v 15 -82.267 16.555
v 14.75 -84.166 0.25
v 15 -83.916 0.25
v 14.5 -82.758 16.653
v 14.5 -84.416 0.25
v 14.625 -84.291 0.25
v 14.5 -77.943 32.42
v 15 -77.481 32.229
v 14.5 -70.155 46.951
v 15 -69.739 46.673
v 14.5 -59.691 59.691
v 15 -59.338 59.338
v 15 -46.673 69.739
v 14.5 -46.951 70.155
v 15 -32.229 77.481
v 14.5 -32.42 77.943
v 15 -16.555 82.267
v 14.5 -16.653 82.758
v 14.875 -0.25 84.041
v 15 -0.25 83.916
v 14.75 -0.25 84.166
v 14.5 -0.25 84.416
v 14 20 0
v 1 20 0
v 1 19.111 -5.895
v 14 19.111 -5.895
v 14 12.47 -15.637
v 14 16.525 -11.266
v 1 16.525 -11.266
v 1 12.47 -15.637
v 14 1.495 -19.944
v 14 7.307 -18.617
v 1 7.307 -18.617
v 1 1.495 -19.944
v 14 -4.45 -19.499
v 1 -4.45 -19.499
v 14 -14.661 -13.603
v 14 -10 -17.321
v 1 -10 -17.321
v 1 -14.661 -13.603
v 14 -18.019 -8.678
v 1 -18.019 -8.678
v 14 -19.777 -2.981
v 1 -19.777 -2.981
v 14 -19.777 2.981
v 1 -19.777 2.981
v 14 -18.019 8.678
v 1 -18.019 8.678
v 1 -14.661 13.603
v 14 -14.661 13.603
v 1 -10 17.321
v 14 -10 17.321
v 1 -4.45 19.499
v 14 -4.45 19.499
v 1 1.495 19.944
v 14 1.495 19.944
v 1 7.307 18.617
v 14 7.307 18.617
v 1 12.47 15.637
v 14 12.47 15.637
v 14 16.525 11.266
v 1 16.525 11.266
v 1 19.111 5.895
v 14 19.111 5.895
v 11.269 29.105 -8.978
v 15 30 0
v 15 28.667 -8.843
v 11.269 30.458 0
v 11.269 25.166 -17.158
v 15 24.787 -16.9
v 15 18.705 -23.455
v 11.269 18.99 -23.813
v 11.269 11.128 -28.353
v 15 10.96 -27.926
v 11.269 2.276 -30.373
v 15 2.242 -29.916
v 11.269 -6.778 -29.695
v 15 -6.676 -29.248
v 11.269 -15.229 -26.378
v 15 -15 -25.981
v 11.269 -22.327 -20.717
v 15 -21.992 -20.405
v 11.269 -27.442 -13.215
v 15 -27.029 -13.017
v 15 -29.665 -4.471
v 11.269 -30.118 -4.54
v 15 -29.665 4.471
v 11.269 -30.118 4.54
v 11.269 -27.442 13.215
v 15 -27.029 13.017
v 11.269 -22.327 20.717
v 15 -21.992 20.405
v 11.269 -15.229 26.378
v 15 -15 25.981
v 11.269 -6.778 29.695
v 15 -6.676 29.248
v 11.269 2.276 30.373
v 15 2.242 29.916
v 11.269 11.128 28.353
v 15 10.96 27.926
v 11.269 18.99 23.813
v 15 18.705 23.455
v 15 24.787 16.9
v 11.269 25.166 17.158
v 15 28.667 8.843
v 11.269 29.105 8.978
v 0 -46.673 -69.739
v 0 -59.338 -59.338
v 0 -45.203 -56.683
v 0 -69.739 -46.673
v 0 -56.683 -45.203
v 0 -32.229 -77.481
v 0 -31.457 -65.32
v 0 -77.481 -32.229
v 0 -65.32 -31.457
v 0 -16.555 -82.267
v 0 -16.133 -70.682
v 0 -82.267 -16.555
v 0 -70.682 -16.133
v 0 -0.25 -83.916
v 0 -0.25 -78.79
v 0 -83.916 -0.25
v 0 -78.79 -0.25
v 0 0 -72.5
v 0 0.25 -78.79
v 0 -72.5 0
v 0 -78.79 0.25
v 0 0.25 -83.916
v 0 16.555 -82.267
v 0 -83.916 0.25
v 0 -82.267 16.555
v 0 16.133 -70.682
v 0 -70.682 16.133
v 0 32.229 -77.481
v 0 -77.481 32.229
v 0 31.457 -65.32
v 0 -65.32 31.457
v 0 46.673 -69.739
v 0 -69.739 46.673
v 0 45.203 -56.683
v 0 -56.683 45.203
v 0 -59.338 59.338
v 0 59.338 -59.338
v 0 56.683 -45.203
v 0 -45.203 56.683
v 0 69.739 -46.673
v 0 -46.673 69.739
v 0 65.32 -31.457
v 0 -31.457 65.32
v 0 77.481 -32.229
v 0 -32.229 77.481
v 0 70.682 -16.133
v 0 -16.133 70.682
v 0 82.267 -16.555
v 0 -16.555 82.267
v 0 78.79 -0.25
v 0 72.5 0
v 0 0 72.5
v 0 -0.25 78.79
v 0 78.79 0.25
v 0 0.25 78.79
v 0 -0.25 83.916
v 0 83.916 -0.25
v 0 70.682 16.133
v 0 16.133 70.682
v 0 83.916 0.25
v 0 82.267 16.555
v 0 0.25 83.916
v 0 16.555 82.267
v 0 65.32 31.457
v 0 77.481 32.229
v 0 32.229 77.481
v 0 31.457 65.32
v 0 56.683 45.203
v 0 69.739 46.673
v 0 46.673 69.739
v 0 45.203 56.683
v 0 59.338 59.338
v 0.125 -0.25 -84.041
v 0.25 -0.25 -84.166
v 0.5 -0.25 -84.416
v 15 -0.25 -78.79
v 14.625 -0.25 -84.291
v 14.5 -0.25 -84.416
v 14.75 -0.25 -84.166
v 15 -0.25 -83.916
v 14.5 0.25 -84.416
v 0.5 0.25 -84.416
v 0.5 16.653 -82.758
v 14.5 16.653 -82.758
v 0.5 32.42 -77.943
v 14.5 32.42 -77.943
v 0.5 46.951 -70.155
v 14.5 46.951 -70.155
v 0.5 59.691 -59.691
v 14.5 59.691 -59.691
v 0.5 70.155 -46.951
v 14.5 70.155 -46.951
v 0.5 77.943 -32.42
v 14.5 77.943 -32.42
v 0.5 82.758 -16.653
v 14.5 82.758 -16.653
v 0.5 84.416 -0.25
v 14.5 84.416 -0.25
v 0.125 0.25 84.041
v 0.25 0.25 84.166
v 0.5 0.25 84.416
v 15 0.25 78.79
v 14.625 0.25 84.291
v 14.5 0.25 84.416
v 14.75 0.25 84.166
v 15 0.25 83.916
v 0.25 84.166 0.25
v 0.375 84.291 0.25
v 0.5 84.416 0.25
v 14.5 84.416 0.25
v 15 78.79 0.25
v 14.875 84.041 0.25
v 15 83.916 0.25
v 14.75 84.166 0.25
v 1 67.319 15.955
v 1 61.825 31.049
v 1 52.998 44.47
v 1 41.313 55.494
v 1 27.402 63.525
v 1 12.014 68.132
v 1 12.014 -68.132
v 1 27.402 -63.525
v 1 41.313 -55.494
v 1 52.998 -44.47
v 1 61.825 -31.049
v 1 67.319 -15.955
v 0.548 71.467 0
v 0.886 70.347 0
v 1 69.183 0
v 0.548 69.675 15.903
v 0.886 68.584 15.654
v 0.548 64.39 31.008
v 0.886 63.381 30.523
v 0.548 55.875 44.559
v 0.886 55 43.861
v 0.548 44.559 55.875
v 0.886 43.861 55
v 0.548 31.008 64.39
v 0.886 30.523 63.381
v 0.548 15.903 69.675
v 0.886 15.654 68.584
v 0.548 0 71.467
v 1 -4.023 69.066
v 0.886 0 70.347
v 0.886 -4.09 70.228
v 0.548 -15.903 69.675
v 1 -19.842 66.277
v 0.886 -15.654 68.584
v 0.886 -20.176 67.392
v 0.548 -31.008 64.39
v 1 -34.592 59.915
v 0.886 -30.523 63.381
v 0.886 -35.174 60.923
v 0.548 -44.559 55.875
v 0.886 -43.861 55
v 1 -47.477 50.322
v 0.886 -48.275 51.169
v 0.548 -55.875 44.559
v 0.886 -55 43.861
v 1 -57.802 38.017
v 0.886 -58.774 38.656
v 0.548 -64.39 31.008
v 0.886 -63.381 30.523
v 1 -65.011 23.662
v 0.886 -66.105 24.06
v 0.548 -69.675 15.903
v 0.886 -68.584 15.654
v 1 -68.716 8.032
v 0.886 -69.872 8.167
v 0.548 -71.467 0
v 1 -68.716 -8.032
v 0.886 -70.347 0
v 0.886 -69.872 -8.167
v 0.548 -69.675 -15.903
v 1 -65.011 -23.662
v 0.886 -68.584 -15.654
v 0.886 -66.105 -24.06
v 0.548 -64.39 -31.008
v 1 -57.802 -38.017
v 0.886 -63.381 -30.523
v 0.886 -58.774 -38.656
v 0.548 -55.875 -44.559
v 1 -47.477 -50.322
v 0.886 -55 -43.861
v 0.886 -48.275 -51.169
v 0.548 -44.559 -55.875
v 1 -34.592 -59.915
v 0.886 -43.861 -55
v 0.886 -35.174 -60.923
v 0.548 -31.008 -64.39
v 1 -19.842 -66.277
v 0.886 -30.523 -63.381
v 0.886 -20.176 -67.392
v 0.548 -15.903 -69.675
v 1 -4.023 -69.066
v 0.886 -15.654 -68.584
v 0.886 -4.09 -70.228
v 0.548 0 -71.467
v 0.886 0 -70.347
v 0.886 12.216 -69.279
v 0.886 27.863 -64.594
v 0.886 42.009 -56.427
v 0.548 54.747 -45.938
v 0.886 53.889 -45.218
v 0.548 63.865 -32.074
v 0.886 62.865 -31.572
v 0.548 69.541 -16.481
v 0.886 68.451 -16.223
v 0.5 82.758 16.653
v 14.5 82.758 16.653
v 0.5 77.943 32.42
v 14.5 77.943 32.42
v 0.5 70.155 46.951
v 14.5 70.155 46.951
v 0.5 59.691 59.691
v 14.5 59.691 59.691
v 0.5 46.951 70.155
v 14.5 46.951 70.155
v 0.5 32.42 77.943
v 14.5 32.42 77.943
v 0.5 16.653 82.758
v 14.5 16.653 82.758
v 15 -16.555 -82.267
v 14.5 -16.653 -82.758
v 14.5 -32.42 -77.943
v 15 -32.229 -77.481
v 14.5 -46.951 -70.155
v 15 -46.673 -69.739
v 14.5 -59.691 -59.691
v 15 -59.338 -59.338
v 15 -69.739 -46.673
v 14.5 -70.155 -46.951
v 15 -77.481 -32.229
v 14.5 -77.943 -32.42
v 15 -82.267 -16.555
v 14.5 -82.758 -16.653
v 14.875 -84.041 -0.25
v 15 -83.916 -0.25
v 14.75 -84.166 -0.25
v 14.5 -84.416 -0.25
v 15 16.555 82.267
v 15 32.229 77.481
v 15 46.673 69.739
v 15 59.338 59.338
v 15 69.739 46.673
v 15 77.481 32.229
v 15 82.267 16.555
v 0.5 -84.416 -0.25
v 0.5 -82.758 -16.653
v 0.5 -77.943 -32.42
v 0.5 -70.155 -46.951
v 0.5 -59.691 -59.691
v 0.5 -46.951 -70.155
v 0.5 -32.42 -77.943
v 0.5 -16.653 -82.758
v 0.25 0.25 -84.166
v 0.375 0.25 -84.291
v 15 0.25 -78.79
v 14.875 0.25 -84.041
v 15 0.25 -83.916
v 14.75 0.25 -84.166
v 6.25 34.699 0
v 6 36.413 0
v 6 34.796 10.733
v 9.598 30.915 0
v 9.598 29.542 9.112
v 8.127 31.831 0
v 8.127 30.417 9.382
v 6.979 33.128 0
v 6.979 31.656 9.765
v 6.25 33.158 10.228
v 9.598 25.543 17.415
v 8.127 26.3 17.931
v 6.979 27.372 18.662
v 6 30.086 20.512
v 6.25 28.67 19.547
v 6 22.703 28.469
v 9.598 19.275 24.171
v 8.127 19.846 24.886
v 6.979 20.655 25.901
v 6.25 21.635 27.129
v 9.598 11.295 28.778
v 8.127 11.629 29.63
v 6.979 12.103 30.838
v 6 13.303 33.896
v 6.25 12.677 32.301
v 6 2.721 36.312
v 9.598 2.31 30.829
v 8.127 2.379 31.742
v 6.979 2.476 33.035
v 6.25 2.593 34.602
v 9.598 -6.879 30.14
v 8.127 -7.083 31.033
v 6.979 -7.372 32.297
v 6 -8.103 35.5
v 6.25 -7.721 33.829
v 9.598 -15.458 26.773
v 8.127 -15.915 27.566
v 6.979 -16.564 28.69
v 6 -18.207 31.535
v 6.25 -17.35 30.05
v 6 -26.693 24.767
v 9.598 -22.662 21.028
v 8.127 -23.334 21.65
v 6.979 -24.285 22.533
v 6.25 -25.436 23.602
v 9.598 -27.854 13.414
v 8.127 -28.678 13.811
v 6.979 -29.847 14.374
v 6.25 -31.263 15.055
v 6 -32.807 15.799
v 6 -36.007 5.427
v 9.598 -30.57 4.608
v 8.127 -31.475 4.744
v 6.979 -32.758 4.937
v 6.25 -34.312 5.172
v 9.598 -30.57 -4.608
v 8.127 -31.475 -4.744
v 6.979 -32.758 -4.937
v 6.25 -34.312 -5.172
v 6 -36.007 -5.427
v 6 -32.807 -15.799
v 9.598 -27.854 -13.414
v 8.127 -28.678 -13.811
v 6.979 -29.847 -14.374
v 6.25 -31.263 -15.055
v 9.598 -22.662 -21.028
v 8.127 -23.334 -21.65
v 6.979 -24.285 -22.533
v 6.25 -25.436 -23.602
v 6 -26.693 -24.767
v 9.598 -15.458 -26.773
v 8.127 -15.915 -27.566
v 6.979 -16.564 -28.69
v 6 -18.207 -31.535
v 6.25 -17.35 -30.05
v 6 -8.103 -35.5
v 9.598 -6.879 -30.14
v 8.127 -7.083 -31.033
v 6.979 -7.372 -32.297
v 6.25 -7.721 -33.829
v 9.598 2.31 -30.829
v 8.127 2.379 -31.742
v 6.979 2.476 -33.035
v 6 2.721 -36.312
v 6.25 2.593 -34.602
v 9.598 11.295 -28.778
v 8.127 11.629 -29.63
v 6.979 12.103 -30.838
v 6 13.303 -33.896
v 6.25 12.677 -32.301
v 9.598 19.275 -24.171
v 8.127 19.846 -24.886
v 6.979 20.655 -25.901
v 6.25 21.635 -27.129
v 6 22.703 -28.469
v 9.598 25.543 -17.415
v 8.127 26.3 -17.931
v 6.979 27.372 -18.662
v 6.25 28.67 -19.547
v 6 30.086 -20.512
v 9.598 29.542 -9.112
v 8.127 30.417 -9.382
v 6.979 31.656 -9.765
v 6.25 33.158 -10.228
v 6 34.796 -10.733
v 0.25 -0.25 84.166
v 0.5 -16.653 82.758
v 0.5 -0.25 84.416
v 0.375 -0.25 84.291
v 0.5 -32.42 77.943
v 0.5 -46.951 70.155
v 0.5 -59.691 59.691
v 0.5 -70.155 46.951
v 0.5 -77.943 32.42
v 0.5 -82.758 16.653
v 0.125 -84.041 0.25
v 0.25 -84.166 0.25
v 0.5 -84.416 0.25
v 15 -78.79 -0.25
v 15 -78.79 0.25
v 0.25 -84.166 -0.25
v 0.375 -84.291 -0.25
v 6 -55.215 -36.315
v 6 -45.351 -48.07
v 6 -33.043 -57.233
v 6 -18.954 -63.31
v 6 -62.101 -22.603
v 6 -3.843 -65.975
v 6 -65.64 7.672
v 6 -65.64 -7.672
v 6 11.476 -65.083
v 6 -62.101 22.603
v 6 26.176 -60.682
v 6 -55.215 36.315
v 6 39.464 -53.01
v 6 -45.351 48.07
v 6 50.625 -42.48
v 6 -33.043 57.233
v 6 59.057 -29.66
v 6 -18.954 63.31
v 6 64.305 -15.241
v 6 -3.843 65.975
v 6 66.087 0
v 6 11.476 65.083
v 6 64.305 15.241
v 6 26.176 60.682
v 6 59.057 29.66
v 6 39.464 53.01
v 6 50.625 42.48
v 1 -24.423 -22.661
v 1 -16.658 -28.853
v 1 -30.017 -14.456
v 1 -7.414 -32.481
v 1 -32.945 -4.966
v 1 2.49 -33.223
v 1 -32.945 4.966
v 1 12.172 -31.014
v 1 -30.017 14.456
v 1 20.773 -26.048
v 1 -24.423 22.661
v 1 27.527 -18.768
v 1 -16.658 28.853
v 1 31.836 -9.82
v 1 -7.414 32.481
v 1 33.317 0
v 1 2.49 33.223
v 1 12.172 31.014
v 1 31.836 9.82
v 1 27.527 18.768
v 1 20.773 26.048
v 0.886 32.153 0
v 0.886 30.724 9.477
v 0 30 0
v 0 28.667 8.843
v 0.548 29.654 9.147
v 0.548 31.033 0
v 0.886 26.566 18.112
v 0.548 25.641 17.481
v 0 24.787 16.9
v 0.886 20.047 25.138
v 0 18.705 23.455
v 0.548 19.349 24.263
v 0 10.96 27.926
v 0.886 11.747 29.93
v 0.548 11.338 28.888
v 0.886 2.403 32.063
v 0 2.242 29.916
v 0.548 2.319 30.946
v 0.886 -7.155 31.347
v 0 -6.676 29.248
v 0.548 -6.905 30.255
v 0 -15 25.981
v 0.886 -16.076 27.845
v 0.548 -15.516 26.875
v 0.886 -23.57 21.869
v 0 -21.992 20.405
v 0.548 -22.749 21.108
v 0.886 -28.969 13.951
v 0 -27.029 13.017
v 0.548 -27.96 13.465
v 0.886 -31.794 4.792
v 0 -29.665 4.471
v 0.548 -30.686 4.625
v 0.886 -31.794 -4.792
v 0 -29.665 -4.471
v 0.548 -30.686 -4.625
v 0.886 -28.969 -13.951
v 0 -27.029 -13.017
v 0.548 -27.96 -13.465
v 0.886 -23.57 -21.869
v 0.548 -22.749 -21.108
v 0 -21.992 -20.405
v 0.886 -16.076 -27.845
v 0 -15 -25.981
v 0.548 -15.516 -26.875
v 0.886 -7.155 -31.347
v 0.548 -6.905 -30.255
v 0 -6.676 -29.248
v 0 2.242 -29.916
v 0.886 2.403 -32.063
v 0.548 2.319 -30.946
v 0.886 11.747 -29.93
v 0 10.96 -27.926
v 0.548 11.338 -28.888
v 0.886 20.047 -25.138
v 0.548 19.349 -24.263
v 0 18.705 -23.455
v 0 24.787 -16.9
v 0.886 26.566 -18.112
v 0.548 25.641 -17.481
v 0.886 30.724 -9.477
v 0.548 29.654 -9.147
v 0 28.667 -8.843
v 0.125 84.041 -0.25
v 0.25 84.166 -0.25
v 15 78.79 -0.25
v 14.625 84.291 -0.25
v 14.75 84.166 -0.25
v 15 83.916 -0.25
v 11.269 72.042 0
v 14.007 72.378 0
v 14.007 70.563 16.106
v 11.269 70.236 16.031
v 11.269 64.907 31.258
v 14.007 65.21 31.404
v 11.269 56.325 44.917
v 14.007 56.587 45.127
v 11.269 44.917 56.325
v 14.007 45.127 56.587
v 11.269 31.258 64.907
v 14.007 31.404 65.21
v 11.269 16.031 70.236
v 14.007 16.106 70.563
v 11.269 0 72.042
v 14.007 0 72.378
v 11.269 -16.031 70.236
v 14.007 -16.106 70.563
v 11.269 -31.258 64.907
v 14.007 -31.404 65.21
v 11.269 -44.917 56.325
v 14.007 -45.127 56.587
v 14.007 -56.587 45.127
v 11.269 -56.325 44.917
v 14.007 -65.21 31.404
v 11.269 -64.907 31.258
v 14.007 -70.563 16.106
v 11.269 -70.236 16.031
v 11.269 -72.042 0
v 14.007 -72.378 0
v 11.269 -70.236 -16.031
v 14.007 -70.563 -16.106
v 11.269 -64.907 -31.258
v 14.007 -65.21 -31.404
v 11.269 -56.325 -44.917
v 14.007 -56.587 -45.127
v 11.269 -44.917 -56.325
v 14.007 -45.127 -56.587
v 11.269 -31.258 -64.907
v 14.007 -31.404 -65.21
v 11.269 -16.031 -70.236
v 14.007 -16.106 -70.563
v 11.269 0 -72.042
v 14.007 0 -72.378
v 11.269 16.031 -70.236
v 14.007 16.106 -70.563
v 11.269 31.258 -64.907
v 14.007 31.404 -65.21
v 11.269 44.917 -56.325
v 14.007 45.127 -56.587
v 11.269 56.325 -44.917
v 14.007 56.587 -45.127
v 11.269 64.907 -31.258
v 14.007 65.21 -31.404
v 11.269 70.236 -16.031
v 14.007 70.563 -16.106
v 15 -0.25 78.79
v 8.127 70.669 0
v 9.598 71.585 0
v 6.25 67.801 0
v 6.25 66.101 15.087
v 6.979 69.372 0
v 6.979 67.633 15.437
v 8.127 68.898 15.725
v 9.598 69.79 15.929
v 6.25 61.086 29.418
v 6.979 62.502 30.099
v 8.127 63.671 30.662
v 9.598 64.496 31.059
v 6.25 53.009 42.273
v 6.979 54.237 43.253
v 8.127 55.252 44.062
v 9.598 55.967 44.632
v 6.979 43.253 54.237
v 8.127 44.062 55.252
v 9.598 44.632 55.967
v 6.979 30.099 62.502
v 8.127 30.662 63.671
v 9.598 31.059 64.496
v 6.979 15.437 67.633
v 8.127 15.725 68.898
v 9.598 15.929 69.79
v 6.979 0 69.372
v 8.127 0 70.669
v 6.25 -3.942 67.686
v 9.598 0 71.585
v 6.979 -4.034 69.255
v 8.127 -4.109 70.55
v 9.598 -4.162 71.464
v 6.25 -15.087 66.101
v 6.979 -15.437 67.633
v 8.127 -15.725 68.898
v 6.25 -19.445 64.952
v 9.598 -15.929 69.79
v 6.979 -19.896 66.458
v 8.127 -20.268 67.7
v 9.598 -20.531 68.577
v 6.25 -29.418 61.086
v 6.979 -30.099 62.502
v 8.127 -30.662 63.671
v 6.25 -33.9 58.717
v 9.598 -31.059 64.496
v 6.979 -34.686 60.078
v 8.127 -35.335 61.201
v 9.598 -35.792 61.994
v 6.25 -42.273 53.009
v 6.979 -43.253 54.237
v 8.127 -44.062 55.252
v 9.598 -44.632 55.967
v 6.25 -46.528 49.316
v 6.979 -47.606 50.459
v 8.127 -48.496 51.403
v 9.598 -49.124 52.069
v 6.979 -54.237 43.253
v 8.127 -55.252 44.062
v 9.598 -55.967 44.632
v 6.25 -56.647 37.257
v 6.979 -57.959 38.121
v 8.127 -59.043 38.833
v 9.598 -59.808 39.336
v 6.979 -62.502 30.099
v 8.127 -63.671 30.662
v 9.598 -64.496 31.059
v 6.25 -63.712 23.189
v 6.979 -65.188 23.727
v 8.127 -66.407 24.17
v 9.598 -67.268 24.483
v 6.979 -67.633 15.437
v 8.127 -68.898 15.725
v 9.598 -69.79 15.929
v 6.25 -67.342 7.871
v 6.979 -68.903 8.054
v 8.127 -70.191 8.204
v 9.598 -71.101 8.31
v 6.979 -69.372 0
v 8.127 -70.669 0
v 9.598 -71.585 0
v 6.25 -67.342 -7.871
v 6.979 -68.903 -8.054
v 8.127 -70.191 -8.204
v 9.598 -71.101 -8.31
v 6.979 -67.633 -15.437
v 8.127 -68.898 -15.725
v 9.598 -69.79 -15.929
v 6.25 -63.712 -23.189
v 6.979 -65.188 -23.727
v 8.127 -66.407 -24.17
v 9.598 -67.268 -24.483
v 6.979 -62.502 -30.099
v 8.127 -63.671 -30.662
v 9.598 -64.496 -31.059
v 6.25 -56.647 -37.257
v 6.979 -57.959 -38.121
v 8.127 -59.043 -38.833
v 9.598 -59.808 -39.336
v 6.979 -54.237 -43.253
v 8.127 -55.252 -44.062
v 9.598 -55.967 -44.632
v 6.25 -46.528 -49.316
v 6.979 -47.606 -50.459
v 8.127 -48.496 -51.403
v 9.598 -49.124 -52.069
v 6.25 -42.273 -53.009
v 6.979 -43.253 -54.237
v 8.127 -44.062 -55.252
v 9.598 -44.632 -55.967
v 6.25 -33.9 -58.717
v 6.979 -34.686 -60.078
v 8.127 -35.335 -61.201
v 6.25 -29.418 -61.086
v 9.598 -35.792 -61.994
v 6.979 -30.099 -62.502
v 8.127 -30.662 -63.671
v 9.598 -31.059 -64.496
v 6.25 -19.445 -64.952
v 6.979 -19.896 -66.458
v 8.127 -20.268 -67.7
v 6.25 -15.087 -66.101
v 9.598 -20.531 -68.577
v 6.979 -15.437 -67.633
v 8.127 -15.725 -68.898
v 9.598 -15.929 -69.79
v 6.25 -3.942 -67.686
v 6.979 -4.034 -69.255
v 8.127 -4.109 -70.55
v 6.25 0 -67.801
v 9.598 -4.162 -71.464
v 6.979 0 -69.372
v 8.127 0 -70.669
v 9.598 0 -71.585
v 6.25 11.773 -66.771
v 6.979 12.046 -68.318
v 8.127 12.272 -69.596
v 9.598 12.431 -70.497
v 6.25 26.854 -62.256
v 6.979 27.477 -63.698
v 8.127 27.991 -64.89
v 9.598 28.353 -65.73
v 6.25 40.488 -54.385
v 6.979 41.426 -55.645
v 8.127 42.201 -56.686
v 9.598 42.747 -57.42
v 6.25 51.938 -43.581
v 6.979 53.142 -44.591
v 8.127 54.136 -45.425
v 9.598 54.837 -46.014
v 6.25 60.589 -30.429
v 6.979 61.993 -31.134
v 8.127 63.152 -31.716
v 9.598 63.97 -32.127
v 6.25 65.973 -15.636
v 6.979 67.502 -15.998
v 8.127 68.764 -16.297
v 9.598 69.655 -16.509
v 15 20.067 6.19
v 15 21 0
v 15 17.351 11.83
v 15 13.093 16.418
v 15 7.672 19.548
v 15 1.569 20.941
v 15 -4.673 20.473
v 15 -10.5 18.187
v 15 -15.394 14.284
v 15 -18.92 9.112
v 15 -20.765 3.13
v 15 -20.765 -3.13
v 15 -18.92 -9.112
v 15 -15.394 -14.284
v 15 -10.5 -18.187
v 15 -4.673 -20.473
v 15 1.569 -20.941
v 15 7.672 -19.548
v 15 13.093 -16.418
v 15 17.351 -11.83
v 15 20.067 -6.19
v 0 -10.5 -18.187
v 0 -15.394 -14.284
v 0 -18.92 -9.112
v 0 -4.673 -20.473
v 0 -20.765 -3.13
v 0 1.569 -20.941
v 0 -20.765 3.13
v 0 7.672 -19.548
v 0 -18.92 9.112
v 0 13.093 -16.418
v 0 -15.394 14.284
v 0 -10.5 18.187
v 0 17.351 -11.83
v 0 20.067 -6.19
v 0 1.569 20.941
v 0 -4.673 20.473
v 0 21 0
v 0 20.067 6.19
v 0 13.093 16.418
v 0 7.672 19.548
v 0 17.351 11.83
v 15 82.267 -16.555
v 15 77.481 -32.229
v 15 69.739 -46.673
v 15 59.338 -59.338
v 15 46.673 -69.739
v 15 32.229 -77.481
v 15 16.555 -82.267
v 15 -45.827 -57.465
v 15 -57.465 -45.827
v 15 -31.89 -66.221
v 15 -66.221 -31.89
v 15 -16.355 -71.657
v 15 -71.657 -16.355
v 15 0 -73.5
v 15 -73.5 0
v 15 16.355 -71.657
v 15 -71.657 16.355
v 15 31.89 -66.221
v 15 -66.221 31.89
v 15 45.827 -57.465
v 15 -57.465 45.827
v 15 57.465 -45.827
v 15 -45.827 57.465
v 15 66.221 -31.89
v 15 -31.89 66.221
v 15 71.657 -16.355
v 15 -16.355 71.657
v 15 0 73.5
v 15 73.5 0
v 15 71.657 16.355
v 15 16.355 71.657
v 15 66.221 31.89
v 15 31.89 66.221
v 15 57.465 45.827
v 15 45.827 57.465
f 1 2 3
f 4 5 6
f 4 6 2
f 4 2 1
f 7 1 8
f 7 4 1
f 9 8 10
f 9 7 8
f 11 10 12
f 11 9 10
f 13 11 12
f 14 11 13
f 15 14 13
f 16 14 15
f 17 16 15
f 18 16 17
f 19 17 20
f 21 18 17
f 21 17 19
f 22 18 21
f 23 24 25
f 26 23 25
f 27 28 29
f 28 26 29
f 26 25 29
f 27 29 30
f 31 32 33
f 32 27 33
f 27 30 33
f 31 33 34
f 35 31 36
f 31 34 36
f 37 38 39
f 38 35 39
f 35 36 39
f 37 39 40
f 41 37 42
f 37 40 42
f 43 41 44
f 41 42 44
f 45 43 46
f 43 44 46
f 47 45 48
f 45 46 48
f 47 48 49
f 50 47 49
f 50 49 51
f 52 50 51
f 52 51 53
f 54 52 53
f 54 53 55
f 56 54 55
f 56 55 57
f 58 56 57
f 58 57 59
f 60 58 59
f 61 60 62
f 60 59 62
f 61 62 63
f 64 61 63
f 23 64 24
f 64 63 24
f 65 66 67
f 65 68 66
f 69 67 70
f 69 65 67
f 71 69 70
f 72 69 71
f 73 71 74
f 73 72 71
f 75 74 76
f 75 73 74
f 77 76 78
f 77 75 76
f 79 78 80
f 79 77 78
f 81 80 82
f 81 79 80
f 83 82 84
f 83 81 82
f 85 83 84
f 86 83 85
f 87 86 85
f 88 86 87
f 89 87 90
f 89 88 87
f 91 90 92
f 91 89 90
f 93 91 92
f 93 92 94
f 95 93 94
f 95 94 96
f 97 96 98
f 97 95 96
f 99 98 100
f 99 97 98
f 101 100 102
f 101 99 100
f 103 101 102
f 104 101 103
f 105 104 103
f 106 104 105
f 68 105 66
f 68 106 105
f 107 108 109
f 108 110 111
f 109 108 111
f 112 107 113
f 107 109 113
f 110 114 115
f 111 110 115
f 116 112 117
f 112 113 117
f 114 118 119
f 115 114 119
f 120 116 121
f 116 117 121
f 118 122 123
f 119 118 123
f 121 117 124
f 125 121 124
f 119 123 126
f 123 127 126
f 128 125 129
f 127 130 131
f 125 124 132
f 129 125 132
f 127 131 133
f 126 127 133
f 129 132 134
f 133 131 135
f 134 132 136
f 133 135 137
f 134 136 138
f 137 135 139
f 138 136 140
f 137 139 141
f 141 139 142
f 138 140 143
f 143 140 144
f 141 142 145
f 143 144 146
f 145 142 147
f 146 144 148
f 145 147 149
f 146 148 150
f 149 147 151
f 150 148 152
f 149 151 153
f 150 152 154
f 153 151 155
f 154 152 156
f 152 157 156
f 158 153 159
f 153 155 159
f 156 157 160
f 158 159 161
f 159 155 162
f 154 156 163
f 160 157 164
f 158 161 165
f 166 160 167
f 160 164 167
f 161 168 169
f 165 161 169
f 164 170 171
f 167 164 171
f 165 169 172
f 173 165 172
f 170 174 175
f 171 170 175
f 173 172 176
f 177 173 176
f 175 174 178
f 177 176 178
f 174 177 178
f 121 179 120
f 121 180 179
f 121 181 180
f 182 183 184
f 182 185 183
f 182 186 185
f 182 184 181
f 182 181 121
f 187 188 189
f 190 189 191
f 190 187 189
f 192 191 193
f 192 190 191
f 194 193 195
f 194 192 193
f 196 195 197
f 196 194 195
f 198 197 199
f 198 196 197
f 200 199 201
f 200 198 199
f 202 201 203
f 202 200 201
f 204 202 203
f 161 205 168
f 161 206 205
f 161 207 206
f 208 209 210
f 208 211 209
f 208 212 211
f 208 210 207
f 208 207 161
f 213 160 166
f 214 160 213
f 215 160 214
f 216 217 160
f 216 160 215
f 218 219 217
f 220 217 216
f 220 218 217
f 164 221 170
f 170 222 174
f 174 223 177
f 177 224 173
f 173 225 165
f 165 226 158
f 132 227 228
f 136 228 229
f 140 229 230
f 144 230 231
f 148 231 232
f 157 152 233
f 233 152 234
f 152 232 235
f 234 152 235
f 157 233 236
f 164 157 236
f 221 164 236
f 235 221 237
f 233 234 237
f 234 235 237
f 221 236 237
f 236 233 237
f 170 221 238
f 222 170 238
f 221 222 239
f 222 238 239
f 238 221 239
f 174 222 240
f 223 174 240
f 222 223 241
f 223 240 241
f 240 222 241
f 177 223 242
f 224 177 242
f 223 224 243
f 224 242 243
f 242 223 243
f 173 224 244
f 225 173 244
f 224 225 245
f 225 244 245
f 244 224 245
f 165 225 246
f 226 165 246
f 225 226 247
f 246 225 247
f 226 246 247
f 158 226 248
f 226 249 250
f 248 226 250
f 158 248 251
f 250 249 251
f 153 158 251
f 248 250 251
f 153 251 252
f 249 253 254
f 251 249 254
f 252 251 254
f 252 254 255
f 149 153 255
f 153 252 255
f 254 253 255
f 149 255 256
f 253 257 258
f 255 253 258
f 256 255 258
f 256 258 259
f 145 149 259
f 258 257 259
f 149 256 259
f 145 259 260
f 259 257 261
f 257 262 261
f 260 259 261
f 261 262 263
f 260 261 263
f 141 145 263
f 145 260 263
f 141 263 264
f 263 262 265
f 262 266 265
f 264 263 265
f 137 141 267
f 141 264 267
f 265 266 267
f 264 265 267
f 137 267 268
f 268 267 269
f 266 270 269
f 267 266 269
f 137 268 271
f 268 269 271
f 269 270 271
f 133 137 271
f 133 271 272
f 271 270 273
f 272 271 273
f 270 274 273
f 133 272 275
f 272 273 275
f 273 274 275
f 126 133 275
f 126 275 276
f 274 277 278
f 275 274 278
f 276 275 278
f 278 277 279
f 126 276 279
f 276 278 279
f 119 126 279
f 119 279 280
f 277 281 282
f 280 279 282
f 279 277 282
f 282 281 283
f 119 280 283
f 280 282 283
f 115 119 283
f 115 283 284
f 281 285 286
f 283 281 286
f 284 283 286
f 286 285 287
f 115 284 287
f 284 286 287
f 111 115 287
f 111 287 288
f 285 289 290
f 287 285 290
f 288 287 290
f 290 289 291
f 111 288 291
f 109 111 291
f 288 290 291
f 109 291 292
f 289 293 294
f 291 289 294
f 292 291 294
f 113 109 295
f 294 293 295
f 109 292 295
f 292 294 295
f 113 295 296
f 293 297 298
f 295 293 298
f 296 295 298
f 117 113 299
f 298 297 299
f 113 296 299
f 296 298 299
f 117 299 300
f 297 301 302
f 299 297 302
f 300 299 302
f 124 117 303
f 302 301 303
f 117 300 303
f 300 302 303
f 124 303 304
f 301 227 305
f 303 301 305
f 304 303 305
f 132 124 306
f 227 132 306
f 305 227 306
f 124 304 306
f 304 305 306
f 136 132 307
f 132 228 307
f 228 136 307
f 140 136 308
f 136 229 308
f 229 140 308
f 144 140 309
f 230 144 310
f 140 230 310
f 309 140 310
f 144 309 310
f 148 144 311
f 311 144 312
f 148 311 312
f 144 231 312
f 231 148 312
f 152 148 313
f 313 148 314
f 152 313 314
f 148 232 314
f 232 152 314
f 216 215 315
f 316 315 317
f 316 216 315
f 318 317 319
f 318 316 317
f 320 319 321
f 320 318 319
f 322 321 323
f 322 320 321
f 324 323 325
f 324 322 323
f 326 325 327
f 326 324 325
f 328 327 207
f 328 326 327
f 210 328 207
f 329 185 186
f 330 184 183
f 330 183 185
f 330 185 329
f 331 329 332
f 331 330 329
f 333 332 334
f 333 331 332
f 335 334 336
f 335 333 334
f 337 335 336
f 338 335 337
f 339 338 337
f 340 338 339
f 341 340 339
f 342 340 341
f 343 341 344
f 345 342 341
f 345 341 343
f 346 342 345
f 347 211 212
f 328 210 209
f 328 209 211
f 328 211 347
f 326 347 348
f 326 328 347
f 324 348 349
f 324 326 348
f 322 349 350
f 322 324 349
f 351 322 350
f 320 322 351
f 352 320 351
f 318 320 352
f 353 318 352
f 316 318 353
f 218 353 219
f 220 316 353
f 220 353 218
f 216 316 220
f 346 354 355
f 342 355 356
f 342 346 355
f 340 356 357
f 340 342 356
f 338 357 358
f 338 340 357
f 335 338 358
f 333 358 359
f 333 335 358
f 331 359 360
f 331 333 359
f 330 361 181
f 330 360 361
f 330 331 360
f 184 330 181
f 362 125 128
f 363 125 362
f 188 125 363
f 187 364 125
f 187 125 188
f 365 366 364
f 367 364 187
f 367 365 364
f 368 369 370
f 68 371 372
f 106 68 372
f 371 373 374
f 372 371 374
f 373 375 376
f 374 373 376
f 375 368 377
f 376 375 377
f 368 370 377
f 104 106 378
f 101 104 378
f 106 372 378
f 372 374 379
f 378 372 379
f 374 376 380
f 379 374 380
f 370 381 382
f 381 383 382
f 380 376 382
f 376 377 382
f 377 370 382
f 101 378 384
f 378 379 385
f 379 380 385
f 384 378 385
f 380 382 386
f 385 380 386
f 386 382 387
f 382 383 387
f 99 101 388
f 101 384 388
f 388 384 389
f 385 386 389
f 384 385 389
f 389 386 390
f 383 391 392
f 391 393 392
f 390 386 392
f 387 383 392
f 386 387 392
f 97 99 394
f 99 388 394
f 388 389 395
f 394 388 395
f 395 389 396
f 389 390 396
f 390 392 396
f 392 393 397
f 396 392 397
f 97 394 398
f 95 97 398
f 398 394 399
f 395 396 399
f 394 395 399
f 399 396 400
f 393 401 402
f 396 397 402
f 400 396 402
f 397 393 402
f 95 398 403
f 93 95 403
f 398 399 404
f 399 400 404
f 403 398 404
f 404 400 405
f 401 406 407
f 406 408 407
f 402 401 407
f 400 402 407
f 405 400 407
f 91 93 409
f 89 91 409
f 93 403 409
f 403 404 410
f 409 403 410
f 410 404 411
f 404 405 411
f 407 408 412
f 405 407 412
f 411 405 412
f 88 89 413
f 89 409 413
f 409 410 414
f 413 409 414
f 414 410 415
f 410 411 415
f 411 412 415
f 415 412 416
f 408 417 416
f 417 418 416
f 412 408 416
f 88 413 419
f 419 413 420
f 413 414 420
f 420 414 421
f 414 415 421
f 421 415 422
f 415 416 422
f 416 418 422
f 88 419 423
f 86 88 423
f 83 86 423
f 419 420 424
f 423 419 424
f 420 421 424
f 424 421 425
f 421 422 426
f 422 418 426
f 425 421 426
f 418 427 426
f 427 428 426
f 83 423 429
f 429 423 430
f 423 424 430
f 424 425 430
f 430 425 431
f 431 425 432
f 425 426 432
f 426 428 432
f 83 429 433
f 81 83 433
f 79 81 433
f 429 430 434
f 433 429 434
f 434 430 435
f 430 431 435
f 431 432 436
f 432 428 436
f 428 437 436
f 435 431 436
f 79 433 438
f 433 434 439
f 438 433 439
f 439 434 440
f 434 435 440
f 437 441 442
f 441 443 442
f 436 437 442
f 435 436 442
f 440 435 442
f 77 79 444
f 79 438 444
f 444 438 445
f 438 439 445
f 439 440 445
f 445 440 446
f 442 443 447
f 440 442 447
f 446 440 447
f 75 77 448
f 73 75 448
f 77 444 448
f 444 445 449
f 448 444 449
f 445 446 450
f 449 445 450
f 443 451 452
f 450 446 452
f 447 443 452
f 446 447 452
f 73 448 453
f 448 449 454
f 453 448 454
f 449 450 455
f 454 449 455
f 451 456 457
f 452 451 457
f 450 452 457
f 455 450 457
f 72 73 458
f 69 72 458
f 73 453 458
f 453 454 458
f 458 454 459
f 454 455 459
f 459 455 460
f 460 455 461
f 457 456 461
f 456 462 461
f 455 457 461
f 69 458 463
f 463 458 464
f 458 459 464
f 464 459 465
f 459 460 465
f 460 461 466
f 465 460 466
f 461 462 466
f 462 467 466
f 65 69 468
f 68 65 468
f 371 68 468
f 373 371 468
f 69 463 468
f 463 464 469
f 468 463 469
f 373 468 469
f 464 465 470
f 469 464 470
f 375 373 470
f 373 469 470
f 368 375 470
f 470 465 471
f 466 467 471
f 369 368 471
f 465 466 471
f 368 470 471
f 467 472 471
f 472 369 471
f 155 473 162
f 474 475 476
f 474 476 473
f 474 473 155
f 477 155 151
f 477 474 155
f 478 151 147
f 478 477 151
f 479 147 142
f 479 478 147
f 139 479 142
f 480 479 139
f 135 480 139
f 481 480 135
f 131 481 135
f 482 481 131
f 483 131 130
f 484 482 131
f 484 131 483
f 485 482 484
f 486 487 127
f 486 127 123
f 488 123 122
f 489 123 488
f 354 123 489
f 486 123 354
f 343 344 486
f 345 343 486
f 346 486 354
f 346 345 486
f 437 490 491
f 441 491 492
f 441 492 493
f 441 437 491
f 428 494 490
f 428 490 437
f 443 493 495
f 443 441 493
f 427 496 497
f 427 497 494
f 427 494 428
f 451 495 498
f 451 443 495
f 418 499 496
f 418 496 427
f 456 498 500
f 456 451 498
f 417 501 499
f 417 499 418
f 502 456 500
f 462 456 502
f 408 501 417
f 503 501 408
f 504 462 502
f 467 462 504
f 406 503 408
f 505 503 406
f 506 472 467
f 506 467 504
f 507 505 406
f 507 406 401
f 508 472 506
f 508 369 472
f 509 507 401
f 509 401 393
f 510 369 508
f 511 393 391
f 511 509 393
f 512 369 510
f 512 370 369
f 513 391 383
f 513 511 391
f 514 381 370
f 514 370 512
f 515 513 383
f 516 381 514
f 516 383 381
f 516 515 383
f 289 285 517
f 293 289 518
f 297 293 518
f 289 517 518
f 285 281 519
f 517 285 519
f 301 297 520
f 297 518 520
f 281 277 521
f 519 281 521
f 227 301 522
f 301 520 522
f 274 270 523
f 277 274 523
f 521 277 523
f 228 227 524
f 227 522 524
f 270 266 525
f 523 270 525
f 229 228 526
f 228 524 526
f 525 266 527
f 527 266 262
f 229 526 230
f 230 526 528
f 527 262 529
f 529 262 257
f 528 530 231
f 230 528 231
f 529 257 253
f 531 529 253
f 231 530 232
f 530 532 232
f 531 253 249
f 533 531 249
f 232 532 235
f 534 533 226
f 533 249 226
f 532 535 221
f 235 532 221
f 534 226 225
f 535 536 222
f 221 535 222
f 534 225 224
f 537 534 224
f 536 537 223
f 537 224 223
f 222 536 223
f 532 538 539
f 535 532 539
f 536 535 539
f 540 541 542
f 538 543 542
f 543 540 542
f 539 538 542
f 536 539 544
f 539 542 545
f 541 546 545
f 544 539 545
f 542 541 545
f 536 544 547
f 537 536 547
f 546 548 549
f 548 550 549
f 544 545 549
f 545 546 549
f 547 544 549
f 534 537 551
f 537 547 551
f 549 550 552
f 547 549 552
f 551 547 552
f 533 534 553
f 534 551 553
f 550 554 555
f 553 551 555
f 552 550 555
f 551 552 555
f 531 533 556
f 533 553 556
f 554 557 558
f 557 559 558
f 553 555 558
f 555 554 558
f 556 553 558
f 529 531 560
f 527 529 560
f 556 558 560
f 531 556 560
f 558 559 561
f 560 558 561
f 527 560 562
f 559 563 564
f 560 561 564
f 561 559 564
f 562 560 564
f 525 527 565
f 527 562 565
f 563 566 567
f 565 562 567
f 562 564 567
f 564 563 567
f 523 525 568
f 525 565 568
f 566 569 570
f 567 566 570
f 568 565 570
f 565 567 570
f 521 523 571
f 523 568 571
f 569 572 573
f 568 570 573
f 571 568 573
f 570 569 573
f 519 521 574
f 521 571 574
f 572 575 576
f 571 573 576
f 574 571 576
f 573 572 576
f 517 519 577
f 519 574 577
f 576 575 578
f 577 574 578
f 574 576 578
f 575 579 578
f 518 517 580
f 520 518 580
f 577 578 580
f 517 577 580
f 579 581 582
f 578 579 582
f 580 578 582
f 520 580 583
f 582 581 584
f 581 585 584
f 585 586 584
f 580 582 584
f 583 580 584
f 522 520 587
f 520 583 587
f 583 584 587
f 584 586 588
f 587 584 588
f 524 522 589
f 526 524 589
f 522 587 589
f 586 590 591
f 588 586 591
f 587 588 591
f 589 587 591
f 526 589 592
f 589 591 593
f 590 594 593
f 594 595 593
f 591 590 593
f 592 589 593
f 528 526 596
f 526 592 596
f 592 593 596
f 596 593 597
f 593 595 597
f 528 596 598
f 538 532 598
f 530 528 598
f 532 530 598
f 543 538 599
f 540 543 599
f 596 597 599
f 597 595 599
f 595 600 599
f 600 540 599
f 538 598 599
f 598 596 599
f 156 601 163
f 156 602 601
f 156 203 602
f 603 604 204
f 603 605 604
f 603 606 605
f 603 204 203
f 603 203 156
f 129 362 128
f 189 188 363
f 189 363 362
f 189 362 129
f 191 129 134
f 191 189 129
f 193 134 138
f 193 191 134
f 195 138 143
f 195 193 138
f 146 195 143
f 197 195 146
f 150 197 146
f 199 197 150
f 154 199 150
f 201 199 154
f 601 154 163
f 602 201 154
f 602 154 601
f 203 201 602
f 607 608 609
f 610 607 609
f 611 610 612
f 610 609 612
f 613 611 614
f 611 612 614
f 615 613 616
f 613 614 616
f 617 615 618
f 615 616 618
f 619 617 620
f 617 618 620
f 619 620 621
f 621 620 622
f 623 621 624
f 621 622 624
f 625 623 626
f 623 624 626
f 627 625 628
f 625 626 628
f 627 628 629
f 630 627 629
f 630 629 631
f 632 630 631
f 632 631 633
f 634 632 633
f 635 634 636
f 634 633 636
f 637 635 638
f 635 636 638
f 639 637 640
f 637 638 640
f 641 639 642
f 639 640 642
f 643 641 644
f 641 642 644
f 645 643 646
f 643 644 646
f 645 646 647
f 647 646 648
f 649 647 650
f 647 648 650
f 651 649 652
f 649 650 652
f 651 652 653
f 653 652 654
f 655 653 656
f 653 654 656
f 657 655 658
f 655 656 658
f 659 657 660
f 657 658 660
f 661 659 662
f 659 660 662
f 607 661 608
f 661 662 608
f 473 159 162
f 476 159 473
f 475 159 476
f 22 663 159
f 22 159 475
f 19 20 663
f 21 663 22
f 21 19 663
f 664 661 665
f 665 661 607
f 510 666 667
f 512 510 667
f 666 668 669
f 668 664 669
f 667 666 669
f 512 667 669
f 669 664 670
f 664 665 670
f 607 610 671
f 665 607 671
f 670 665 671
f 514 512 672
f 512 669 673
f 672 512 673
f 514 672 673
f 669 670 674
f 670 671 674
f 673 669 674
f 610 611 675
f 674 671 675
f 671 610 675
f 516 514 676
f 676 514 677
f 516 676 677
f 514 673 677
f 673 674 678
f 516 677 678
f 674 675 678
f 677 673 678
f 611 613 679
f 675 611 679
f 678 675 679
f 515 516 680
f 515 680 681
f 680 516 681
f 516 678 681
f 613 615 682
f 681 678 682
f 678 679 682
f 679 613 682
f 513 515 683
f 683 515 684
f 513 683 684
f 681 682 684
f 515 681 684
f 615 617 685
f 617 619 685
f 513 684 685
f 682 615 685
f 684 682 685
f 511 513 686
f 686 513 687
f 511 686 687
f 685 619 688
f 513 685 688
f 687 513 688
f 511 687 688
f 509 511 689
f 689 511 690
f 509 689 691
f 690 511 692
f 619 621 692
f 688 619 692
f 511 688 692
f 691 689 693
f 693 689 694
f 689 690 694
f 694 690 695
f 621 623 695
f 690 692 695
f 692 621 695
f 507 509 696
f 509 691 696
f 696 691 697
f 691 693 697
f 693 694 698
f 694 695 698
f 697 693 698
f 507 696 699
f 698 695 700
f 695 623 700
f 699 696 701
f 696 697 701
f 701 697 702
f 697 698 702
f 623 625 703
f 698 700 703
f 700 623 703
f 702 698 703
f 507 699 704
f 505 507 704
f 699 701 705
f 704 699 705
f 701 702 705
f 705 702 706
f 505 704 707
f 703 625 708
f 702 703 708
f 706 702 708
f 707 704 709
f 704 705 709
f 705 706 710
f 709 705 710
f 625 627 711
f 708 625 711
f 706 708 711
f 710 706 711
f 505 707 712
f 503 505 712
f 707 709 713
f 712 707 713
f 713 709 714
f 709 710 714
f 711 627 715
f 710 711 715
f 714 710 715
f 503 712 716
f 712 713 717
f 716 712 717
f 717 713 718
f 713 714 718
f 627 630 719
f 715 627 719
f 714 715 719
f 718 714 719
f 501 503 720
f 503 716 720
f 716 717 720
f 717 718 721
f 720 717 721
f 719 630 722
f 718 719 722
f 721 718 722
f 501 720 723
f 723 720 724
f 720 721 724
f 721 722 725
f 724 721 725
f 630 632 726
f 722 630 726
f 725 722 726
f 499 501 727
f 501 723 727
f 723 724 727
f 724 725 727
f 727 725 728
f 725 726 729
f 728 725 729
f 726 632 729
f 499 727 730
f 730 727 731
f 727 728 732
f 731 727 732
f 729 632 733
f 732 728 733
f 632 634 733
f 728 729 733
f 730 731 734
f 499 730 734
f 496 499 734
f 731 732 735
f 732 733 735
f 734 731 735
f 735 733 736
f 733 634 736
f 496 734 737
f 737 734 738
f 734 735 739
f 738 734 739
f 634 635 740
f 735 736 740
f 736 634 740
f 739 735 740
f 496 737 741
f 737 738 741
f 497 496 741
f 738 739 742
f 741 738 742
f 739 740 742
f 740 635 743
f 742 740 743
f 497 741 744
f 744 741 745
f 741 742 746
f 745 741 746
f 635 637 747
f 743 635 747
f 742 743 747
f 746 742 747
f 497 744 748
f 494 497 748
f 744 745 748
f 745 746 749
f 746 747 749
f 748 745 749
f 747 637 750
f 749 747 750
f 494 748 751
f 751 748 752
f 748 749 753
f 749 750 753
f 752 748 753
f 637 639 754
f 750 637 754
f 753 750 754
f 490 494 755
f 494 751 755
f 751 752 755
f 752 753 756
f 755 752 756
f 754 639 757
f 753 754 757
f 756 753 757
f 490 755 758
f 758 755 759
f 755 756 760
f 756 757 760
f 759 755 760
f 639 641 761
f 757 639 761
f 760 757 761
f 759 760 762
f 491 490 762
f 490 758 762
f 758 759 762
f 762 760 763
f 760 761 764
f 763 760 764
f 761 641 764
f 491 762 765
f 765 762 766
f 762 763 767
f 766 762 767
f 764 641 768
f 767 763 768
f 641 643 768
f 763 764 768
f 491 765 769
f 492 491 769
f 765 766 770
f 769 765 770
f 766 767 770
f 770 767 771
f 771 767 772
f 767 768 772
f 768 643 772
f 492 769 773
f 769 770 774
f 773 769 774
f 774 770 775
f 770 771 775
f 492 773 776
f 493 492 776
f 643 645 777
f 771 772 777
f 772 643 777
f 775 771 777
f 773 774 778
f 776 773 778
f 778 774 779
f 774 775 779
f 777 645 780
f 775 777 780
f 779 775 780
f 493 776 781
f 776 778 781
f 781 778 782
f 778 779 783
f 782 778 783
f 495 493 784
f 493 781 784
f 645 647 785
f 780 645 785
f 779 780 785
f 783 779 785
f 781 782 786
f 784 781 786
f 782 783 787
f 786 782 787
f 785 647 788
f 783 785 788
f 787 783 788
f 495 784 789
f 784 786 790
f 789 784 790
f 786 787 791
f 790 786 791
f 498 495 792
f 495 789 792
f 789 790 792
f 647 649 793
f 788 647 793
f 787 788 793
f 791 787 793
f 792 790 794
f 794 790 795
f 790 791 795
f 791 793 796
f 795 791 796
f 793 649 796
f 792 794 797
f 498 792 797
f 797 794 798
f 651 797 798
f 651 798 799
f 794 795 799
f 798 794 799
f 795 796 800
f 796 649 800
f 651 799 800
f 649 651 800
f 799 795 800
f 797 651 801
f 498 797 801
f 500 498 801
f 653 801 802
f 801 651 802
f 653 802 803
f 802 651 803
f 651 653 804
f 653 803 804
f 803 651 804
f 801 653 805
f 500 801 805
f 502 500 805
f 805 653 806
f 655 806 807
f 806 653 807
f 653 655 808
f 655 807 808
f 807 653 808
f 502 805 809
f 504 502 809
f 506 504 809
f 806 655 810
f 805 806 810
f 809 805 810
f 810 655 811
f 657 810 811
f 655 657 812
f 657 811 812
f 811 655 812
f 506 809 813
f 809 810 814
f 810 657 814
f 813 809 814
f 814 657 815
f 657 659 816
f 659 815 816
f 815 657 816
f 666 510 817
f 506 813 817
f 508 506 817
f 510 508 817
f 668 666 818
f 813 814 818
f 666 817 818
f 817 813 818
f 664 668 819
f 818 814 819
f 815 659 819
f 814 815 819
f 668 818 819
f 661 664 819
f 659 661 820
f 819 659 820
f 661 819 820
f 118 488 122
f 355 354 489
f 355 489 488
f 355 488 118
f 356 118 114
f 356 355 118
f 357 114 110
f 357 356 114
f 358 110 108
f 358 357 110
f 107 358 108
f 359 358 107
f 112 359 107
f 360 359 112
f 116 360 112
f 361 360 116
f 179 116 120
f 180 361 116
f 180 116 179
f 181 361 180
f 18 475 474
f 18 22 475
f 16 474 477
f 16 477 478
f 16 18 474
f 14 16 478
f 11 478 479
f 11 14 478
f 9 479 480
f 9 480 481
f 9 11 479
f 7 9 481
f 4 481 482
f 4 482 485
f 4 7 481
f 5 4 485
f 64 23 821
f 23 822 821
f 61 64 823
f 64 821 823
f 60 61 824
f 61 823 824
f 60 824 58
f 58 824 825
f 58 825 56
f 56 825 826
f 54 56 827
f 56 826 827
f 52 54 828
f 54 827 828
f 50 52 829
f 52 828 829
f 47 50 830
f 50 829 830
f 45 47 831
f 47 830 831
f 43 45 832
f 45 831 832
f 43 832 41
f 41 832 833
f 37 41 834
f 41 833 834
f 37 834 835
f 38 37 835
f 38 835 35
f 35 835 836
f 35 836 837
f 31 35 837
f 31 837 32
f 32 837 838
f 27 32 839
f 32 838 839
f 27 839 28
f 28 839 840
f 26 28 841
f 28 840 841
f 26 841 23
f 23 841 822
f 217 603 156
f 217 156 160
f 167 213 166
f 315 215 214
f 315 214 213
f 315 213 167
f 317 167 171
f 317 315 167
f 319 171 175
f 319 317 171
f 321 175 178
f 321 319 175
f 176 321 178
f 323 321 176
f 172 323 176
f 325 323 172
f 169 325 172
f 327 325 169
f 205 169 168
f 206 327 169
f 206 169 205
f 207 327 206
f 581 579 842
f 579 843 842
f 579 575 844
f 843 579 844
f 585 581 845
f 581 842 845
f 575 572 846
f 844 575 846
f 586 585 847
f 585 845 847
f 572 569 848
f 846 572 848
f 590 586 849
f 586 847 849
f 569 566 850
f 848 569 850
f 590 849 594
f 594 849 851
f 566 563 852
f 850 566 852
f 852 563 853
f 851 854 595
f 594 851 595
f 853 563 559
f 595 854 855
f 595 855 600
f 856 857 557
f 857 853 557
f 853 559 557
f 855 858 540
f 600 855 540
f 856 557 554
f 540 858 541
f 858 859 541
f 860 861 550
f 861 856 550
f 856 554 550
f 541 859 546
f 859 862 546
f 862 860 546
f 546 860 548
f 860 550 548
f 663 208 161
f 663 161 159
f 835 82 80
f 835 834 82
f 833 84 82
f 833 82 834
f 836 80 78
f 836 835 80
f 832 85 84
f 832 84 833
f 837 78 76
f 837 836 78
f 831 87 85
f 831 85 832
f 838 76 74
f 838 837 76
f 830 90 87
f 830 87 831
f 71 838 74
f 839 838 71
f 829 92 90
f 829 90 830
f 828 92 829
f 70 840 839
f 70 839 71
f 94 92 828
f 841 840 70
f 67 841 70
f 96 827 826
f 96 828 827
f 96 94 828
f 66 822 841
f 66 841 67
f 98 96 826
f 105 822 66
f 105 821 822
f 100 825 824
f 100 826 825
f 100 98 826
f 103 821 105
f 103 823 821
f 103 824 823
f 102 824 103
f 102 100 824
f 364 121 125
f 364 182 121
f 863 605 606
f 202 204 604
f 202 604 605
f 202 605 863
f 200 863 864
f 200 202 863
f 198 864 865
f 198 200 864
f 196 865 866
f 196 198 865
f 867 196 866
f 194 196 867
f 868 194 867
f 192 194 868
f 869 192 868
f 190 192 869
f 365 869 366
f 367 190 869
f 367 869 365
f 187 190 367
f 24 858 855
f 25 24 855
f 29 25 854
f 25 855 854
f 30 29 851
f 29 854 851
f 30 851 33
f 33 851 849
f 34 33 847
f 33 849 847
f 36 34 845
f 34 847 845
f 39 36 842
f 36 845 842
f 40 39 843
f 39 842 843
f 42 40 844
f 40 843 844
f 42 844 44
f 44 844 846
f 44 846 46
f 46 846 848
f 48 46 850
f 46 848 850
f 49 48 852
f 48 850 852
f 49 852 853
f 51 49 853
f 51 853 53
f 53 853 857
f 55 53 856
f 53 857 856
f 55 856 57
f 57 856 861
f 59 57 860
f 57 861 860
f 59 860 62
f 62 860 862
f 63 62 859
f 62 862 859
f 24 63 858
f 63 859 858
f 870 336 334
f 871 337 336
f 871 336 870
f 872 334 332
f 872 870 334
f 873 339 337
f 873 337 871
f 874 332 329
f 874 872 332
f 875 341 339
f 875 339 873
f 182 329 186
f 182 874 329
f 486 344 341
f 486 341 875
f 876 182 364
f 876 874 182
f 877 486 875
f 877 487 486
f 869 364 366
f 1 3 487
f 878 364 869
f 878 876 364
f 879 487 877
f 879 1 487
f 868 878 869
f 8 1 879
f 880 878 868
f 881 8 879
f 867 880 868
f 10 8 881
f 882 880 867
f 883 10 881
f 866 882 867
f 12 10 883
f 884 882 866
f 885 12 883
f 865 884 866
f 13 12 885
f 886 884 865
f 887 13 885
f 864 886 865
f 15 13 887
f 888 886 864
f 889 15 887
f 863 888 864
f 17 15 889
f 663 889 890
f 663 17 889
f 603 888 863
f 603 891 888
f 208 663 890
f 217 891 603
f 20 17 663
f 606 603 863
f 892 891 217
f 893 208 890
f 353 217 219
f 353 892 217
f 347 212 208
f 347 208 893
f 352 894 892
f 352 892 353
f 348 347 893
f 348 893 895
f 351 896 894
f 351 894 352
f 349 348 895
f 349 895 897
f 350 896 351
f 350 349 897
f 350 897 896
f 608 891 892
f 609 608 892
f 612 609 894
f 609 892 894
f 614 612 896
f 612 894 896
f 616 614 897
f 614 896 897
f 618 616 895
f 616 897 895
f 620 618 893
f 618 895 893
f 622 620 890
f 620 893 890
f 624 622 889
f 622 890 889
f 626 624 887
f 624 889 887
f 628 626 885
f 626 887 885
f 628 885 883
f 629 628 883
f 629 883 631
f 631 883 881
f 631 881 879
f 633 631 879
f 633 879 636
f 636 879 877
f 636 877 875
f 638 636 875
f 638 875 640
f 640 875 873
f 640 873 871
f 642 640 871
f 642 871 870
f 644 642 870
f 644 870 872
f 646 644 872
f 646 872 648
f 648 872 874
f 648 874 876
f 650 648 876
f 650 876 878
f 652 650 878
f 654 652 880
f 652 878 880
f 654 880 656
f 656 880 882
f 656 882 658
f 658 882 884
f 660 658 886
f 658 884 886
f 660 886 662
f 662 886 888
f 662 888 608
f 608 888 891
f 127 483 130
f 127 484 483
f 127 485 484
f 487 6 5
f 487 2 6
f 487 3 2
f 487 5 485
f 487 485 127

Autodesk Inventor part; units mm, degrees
ref_plane "YZ Plane" through (0, 0, 0) normal (1, 0, 0) x (0, 1, 0)
ref_plane "XZ Plane" through (0, 0, 0) normal (0, 1, 0) x (-1, 0, 0)
ref_plane "XY Plane" through (0, 0, 0) normal (0, 0, 1) x (1, 0, 0)
sketch "Эскиз1" plane through (0, 0, 0) normal (0, 0, 1) x (1, 0, 0)
  line L0 (0, 20) -> (0, 30)
  line L1 (1, 30.1228) -> (1, 72.3772)
  line L2 (0, 72.5) -> (0, 84.4165)
  line L3 (0, 84.4165) -> (15, 84.4165)
  line L4 (6, 71.3949) -> (6, 31.1051)
  line L5 (15, 20) -> (0, 20)
  line L6 (15, 30) -> (15, 20)
  line L7 (-3, 0) -> (18, 0) construction
  line L8 (0, -16.8833) -> (0, 101.2998) construction
  line L9 (15, 84.4165) -> (15, 72.5)
  line L10 (15, 72.5) -> (6, 71.3949)
  line L11 (15, 30) -> (6, 31.1051)
  line L12 (0, 30) -> (1, 30.1228)
  line L13 (0, 72.5) -> (1, 72.3772)
  point P0 (0, 0)
  point P1 (1, 77.4165)
  point P2 (7, 77.4165)
  point P3 (7, 28)
  dimension "d0" = 15
  dimension "d2" = 5
  dimension "d5" = 40
  dimension "d7" = 168.833
  dimension "d9" = 0
  dimension "d17" = 83
  dimension "d18" = 83
  dimension "d19" = 60
  dimension "d20" = 83
  dimension "d21" = 83
  dimension "d22" = 2
  dimension "d43" = 145
revolve "Вращение1" add sketch "Эскиз1" angle 360 about axis through (-10, 0, 0) along (1, 0, 0)
chamfer "Фаска1" distance 1 angle 45 2 edges at (15, -20, 0) (0, -20, 0)
fillet "Сопряжение3" radius 6 2 edges at (6, -71.3949, 0) (6, -31.1051, 0)
chamfer "Фаска2" distance 1 angle 45 1 edges at (15, -72.5, 0)
fillet "Сопряжение4" radius 6 2 edges at (1, -30.1228, 0) (1, -72.3772, 0)
chamfer "Фаска4" distance 0.5 angle 45 2 edges at (0, -84.4165, 0) (15, -84.4165, 0)
sketch "Эскиз2" plane through (15, 0, 0) normal (1, 0, 0) x (0, 0, -1)
  circle A0 centre (0, 0) radius 84.4165 projected
  circle A1 centre (0, 0) radius 73.5 projected
  circle A2 centre (0, 0) radius 84.4165 projected
  line L0 (-84.4161, 0.25) -> (-78.79, 0.25)
  line L1 (-78.79, 0.25) -> (-78.79, -0.25)
  line L2 (-78.79, -0.25) -> (-84.4161, -0.25)
  line L3 (0, -118.1831) -> (0, 118.1831) projected
  line L4 (118.1831, 0) -> (-118.1831, 0) projected
  dimension "d33" = 78.79
  dimension "d34" = 0.5
extrude "Выдавливание1" cut sketch "Эскиз2" against normal through all contours L0 L1 L4 A0 | A0 L4 L1 L2
pattern_circular "Круговой массив1" count 4 over 360 about axis through (-10, 0, 0) along (1, 0, 0) of "Выдавливание1"
properties part number "Wheel"
